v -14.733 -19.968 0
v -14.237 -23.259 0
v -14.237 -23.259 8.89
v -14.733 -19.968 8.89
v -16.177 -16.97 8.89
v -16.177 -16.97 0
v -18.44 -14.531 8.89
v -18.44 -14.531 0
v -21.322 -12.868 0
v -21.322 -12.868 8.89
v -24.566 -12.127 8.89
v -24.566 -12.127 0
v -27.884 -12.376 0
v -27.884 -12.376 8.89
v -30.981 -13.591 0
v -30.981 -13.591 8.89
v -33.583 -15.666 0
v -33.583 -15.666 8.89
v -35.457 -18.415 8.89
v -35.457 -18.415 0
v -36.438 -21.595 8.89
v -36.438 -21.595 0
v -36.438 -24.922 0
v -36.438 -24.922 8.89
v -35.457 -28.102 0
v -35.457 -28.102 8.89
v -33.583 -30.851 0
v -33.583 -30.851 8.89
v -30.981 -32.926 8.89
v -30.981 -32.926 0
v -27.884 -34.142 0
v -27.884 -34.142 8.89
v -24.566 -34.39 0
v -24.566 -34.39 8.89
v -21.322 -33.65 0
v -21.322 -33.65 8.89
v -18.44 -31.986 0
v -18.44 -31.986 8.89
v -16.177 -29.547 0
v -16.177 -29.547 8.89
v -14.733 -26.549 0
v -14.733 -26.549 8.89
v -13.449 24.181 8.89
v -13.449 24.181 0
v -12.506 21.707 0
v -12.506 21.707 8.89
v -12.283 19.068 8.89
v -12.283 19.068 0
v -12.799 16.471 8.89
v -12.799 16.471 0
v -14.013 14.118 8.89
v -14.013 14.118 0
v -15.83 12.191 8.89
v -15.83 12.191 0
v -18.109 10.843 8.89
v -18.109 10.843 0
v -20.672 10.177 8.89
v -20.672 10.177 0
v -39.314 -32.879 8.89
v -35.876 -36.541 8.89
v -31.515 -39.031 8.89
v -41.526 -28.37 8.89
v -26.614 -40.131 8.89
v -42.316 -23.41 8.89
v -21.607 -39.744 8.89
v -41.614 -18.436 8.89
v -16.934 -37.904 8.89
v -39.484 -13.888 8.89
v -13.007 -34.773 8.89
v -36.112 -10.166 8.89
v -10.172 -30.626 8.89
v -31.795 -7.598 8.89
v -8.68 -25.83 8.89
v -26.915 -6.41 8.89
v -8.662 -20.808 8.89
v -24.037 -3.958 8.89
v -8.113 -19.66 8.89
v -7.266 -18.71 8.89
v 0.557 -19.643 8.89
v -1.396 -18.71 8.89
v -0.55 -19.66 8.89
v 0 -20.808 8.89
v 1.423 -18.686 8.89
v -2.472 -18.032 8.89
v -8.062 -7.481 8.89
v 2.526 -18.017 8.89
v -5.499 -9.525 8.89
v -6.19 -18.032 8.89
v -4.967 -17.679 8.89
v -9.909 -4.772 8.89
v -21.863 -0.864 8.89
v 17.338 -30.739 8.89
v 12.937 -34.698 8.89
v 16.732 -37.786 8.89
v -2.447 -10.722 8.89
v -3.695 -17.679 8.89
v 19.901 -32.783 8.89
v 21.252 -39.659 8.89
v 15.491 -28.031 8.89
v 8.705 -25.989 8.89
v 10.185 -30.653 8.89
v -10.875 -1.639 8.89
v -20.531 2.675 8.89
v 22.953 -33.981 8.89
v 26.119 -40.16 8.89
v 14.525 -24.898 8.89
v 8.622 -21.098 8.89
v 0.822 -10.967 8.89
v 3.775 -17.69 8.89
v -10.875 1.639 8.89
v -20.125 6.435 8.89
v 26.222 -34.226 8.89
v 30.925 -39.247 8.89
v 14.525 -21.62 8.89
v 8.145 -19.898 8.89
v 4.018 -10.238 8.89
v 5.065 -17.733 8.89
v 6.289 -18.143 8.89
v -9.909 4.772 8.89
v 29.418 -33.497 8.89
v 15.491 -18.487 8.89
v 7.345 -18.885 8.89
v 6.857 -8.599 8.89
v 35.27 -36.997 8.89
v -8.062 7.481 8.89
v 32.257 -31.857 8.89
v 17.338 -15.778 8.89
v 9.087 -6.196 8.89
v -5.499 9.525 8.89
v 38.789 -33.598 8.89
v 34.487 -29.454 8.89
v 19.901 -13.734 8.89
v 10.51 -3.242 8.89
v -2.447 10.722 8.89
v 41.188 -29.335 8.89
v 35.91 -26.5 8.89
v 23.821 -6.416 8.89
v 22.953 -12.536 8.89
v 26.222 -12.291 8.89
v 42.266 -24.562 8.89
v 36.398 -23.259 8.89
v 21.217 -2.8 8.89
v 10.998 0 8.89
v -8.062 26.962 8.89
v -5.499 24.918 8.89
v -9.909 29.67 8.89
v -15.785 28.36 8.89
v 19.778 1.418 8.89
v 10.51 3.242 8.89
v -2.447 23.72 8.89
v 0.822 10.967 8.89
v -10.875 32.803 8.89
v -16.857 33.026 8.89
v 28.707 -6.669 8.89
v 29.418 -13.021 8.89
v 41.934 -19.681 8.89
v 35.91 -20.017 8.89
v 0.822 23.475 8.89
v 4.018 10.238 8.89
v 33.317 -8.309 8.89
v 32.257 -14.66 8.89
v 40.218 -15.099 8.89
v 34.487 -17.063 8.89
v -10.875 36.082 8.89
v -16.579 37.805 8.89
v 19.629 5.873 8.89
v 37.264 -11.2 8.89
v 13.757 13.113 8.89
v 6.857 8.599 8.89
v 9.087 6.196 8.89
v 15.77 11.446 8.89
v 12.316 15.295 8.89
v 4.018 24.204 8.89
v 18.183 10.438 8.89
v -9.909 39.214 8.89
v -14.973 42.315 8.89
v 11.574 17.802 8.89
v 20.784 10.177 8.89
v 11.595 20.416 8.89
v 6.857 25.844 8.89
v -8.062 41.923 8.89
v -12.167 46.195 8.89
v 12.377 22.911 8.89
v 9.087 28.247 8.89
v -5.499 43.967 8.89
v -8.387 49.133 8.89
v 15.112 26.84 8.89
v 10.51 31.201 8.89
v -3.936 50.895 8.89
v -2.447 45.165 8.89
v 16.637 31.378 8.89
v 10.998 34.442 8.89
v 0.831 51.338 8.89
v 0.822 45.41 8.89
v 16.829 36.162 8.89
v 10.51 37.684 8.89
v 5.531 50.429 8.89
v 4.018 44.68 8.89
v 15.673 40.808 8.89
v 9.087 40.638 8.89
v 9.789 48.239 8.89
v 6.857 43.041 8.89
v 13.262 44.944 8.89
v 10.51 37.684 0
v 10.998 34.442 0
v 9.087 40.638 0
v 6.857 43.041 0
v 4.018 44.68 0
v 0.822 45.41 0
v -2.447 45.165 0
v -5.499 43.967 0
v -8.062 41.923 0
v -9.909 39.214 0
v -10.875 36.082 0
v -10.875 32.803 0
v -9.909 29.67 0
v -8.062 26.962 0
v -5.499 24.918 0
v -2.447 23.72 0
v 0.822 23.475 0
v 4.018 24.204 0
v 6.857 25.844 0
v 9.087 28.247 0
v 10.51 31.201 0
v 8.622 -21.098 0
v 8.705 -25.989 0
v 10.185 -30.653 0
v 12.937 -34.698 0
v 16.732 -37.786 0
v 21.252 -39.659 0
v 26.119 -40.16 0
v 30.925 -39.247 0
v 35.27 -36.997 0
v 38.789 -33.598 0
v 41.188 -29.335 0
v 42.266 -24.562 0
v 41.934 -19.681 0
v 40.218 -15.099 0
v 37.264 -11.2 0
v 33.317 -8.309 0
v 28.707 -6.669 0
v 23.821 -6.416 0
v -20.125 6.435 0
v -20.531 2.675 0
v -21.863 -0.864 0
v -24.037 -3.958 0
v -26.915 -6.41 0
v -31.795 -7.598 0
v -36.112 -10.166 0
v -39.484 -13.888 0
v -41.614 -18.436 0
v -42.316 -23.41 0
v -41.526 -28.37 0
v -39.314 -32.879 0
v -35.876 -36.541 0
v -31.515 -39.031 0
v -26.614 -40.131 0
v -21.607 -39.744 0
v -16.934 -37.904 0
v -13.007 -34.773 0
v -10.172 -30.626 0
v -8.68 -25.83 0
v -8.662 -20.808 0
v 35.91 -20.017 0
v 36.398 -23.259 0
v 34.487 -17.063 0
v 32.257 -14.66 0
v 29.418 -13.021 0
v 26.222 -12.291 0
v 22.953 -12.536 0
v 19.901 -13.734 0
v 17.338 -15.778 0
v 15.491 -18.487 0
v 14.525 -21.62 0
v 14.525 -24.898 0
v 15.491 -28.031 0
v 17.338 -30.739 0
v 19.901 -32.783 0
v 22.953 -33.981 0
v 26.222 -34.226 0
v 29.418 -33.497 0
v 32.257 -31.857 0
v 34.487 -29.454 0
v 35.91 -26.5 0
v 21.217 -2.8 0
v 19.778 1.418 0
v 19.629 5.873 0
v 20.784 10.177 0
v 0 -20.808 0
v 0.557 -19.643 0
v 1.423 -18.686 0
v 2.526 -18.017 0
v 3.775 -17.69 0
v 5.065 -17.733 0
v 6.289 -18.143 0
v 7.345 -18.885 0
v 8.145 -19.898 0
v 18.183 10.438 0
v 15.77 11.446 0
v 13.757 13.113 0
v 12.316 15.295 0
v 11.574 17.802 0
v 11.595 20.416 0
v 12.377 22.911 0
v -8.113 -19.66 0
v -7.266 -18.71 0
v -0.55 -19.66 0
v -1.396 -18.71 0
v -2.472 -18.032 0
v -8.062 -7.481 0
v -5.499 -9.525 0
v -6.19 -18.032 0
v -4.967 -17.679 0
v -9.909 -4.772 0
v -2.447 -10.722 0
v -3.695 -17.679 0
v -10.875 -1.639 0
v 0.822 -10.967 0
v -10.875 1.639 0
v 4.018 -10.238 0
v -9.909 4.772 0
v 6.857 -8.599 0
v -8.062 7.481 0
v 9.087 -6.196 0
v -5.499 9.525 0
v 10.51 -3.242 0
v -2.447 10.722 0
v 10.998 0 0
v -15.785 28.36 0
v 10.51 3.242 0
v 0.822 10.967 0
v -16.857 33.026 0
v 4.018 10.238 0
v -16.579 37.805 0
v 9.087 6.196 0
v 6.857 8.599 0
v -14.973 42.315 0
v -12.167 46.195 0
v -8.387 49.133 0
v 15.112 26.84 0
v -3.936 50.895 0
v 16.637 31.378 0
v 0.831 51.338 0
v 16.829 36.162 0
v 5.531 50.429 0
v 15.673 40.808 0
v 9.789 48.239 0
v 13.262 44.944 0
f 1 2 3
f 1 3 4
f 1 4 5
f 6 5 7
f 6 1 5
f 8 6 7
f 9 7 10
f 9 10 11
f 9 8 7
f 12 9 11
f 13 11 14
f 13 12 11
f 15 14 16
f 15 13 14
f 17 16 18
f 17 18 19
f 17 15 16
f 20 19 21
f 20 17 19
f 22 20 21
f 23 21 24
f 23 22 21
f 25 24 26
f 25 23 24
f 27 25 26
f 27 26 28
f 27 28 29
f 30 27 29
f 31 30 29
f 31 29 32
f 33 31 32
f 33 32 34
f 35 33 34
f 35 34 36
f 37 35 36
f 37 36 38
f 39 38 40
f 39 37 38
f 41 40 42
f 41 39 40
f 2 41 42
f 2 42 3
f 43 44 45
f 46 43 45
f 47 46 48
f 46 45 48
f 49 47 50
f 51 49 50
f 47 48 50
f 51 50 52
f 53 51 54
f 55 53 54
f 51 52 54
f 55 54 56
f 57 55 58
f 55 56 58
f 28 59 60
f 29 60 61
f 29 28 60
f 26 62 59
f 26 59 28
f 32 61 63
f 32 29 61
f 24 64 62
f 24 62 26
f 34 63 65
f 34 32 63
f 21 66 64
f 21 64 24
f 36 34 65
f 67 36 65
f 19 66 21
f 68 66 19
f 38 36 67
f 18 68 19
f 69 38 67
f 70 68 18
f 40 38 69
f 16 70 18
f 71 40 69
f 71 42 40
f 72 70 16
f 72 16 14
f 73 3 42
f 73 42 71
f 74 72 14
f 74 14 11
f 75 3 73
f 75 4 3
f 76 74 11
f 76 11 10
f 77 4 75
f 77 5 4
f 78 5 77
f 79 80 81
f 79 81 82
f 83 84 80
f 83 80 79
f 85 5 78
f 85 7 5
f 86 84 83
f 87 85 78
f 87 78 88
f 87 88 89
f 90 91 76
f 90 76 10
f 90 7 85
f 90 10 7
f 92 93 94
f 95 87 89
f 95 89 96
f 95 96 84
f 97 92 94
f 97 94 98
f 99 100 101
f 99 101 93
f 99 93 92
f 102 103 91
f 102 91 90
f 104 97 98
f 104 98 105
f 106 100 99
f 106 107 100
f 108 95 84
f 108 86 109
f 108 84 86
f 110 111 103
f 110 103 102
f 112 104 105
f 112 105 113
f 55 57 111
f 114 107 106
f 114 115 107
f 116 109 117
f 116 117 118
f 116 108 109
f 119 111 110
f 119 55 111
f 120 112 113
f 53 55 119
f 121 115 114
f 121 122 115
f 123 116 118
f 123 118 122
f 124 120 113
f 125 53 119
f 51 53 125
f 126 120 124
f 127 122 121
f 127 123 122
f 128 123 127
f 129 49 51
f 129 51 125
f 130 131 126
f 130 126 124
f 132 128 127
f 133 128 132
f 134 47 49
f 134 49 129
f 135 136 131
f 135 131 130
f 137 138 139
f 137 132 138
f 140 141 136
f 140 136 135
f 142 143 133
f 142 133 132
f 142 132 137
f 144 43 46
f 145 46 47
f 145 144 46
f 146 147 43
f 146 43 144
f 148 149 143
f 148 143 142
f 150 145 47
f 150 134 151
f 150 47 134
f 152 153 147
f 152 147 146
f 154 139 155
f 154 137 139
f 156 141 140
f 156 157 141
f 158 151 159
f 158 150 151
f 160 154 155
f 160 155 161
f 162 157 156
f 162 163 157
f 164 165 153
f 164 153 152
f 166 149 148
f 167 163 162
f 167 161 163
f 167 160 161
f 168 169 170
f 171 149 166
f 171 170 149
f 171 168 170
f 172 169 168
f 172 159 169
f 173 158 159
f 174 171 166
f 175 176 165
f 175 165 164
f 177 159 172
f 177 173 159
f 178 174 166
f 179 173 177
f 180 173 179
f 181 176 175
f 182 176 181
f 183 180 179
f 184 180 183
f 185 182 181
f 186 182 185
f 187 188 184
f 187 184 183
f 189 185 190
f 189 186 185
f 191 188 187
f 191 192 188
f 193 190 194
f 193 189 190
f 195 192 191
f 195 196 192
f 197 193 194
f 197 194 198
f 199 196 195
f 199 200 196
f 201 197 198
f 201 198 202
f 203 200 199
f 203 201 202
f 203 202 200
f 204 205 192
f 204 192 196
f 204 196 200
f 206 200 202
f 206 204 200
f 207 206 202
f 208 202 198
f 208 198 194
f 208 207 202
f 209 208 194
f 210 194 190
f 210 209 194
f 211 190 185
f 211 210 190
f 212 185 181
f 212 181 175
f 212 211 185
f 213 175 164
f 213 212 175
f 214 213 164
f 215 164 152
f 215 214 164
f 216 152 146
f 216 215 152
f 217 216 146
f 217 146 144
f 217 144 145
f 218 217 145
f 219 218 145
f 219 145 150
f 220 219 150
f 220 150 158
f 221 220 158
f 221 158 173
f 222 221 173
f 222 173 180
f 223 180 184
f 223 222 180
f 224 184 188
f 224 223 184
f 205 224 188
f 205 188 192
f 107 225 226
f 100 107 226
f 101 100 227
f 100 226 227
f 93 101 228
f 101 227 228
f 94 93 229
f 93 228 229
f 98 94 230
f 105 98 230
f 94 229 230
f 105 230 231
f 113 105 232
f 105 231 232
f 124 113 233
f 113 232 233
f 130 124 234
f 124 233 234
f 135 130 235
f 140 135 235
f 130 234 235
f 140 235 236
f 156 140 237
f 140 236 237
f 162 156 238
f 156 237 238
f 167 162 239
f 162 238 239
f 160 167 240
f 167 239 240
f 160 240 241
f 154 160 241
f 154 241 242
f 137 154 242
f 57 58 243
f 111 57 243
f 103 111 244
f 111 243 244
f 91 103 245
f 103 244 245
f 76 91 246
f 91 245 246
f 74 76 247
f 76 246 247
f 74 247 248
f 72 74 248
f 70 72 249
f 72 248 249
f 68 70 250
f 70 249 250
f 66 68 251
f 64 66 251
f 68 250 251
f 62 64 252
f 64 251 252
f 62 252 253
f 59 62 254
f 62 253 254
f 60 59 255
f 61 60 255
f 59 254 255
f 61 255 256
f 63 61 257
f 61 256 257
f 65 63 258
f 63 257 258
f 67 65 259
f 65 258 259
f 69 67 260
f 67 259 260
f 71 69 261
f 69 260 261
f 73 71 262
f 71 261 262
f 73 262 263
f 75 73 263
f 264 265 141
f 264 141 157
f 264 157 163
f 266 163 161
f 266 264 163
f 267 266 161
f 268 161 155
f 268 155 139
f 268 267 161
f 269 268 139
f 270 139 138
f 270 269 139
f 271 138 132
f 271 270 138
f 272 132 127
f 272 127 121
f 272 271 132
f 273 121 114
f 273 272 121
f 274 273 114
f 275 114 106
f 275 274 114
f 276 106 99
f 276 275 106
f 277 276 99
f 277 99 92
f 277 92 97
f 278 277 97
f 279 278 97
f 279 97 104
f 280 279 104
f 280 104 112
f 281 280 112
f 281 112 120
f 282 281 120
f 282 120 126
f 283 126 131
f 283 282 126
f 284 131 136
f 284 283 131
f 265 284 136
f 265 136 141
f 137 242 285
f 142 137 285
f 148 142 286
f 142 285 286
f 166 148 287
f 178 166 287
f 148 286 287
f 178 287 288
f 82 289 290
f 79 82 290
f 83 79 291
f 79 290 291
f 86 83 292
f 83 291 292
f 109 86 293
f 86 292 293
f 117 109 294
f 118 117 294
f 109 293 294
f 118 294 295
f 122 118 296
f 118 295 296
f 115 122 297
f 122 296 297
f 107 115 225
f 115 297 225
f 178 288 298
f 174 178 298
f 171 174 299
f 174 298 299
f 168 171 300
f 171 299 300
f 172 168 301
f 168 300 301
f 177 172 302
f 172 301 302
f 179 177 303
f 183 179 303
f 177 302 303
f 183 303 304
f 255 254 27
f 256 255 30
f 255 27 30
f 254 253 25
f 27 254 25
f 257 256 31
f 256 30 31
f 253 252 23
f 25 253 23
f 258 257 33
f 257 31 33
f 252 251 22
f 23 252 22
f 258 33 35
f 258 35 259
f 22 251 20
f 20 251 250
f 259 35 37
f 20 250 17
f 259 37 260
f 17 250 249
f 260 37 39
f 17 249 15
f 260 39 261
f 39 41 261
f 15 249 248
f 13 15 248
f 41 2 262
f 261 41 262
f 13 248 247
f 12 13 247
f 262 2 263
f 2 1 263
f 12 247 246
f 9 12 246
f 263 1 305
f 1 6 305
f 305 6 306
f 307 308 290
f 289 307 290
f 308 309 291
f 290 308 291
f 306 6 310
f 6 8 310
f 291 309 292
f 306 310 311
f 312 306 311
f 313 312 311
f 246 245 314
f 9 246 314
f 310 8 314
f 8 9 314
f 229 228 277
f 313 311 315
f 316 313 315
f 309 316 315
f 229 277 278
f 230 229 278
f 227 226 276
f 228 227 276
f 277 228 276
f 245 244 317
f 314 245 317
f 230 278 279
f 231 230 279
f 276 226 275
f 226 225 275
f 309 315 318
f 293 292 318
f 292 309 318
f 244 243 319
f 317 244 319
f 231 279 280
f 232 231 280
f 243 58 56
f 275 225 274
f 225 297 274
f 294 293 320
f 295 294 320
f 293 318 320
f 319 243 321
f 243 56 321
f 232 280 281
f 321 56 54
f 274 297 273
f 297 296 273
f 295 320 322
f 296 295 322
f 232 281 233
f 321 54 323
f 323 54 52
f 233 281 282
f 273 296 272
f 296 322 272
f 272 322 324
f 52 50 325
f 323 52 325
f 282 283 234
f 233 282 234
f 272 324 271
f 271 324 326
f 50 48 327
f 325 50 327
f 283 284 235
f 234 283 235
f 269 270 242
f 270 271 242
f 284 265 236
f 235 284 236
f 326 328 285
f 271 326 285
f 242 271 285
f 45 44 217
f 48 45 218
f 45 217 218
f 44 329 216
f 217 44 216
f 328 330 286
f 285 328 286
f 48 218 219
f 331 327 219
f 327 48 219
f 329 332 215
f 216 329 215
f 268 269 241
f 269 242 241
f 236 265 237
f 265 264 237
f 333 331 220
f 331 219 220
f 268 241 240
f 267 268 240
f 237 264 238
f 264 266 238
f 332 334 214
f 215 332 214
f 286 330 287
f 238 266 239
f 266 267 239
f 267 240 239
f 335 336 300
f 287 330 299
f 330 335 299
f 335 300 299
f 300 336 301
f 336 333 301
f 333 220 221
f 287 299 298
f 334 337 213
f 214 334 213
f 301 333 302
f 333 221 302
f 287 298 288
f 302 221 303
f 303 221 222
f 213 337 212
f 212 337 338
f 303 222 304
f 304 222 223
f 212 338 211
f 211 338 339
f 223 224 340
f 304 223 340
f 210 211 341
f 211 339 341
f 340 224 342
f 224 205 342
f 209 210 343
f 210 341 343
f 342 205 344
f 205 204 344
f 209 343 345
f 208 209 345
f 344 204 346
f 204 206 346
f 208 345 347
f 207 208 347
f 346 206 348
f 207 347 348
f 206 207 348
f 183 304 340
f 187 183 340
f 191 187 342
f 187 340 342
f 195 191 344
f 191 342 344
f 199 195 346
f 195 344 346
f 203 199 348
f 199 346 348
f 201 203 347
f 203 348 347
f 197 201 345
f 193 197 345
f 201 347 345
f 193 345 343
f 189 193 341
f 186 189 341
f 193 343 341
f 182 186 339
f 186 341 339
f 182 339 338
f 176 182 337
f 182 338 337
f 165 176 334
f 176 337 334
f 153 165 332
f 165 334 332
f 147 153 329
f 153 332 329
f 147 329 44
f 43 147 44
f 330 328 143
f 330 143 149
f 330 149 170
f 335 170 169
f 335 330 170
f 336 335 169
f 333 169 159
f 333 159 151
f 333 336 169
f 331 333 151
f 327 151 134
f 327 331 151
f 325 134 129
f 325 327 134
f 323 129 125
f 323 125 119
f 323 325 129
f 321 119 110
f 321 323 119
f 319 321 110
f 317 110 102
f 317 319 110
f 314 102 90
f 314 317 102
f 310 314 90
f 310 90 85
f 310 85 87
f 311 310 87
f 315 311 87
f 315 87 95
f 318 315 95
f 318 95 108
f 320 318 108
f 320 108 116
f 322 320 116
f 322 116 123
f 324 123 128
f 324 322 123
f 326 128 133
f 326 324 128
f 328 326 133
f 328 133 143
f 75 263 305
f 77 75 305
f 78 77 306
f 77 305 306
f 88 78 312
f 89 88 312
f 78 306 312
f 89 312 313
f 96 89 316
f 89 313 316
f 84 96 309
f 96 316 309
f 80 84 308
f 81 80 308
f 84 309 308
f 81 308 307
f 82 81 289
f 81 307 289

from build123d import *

# Parameters (mm, degrees)
F0_R     = 11.162789
F0_R_2   = 10.9982
F1_DEPTH = 8.89


with BuildPart() as f1:
    # F0 (on Top) → F1 (new body)
    with BuildSketch(Plane.XY):
        with BuildLine():
            ThreePointArc((20.78403, 10.17702), (12.955474, 14.150564), (12.376799, 22.910729))
            ThreePointArc((12.376799, 22.910729), (0.831126, 51.33837), (-13.448812, 24.181111))
            ThreePointArc((-13.448812, 24.181111), (-13.323241, 15.251649), (-20.671656, 10.17702))
            ThreePointArc((-20.671656, 10.17702), (-21.084916, 0.863796), (-26.915357, -6.410328))
            ThreePointArc((-26.915357, -6.410328), (-35.876376, -36.540667), (-8.662071, -20.807938))
            ThreePointArc((-8.662071, -20.807938), (-4.331036, -17.634318), (0, -20.807938))
            ThreePointArc((0, -20.807938), (4.421541, -17.66469), (8.622223, -21.097517))
            ThreePointArc((8.622223, -21.097517), (37.152681, -35.425851), (23.821326, -6.416143))
            ThreePointArc((23.821326, -6.416143), (19.777657, 1.418246), (20.78403, 10.17702))
        make_face()
        with Locations((-25.4, -23.25872)):
            Circle(F0_R, mode=Mode.SUBTRACT)
        Circle(F0_R_2, mode=Mode.SUBTRACT)
        with Locations((25.4, -23.25872)):
            Circle(F0_R_2, mode=Mode.SUBTRACT)
        with Locations((0, 34.4424)):
            Circle(F0_R_2, mode=Mode.SUBTRACT)
    extrude(amount=F1_DEPTH)


solid = f1.part
